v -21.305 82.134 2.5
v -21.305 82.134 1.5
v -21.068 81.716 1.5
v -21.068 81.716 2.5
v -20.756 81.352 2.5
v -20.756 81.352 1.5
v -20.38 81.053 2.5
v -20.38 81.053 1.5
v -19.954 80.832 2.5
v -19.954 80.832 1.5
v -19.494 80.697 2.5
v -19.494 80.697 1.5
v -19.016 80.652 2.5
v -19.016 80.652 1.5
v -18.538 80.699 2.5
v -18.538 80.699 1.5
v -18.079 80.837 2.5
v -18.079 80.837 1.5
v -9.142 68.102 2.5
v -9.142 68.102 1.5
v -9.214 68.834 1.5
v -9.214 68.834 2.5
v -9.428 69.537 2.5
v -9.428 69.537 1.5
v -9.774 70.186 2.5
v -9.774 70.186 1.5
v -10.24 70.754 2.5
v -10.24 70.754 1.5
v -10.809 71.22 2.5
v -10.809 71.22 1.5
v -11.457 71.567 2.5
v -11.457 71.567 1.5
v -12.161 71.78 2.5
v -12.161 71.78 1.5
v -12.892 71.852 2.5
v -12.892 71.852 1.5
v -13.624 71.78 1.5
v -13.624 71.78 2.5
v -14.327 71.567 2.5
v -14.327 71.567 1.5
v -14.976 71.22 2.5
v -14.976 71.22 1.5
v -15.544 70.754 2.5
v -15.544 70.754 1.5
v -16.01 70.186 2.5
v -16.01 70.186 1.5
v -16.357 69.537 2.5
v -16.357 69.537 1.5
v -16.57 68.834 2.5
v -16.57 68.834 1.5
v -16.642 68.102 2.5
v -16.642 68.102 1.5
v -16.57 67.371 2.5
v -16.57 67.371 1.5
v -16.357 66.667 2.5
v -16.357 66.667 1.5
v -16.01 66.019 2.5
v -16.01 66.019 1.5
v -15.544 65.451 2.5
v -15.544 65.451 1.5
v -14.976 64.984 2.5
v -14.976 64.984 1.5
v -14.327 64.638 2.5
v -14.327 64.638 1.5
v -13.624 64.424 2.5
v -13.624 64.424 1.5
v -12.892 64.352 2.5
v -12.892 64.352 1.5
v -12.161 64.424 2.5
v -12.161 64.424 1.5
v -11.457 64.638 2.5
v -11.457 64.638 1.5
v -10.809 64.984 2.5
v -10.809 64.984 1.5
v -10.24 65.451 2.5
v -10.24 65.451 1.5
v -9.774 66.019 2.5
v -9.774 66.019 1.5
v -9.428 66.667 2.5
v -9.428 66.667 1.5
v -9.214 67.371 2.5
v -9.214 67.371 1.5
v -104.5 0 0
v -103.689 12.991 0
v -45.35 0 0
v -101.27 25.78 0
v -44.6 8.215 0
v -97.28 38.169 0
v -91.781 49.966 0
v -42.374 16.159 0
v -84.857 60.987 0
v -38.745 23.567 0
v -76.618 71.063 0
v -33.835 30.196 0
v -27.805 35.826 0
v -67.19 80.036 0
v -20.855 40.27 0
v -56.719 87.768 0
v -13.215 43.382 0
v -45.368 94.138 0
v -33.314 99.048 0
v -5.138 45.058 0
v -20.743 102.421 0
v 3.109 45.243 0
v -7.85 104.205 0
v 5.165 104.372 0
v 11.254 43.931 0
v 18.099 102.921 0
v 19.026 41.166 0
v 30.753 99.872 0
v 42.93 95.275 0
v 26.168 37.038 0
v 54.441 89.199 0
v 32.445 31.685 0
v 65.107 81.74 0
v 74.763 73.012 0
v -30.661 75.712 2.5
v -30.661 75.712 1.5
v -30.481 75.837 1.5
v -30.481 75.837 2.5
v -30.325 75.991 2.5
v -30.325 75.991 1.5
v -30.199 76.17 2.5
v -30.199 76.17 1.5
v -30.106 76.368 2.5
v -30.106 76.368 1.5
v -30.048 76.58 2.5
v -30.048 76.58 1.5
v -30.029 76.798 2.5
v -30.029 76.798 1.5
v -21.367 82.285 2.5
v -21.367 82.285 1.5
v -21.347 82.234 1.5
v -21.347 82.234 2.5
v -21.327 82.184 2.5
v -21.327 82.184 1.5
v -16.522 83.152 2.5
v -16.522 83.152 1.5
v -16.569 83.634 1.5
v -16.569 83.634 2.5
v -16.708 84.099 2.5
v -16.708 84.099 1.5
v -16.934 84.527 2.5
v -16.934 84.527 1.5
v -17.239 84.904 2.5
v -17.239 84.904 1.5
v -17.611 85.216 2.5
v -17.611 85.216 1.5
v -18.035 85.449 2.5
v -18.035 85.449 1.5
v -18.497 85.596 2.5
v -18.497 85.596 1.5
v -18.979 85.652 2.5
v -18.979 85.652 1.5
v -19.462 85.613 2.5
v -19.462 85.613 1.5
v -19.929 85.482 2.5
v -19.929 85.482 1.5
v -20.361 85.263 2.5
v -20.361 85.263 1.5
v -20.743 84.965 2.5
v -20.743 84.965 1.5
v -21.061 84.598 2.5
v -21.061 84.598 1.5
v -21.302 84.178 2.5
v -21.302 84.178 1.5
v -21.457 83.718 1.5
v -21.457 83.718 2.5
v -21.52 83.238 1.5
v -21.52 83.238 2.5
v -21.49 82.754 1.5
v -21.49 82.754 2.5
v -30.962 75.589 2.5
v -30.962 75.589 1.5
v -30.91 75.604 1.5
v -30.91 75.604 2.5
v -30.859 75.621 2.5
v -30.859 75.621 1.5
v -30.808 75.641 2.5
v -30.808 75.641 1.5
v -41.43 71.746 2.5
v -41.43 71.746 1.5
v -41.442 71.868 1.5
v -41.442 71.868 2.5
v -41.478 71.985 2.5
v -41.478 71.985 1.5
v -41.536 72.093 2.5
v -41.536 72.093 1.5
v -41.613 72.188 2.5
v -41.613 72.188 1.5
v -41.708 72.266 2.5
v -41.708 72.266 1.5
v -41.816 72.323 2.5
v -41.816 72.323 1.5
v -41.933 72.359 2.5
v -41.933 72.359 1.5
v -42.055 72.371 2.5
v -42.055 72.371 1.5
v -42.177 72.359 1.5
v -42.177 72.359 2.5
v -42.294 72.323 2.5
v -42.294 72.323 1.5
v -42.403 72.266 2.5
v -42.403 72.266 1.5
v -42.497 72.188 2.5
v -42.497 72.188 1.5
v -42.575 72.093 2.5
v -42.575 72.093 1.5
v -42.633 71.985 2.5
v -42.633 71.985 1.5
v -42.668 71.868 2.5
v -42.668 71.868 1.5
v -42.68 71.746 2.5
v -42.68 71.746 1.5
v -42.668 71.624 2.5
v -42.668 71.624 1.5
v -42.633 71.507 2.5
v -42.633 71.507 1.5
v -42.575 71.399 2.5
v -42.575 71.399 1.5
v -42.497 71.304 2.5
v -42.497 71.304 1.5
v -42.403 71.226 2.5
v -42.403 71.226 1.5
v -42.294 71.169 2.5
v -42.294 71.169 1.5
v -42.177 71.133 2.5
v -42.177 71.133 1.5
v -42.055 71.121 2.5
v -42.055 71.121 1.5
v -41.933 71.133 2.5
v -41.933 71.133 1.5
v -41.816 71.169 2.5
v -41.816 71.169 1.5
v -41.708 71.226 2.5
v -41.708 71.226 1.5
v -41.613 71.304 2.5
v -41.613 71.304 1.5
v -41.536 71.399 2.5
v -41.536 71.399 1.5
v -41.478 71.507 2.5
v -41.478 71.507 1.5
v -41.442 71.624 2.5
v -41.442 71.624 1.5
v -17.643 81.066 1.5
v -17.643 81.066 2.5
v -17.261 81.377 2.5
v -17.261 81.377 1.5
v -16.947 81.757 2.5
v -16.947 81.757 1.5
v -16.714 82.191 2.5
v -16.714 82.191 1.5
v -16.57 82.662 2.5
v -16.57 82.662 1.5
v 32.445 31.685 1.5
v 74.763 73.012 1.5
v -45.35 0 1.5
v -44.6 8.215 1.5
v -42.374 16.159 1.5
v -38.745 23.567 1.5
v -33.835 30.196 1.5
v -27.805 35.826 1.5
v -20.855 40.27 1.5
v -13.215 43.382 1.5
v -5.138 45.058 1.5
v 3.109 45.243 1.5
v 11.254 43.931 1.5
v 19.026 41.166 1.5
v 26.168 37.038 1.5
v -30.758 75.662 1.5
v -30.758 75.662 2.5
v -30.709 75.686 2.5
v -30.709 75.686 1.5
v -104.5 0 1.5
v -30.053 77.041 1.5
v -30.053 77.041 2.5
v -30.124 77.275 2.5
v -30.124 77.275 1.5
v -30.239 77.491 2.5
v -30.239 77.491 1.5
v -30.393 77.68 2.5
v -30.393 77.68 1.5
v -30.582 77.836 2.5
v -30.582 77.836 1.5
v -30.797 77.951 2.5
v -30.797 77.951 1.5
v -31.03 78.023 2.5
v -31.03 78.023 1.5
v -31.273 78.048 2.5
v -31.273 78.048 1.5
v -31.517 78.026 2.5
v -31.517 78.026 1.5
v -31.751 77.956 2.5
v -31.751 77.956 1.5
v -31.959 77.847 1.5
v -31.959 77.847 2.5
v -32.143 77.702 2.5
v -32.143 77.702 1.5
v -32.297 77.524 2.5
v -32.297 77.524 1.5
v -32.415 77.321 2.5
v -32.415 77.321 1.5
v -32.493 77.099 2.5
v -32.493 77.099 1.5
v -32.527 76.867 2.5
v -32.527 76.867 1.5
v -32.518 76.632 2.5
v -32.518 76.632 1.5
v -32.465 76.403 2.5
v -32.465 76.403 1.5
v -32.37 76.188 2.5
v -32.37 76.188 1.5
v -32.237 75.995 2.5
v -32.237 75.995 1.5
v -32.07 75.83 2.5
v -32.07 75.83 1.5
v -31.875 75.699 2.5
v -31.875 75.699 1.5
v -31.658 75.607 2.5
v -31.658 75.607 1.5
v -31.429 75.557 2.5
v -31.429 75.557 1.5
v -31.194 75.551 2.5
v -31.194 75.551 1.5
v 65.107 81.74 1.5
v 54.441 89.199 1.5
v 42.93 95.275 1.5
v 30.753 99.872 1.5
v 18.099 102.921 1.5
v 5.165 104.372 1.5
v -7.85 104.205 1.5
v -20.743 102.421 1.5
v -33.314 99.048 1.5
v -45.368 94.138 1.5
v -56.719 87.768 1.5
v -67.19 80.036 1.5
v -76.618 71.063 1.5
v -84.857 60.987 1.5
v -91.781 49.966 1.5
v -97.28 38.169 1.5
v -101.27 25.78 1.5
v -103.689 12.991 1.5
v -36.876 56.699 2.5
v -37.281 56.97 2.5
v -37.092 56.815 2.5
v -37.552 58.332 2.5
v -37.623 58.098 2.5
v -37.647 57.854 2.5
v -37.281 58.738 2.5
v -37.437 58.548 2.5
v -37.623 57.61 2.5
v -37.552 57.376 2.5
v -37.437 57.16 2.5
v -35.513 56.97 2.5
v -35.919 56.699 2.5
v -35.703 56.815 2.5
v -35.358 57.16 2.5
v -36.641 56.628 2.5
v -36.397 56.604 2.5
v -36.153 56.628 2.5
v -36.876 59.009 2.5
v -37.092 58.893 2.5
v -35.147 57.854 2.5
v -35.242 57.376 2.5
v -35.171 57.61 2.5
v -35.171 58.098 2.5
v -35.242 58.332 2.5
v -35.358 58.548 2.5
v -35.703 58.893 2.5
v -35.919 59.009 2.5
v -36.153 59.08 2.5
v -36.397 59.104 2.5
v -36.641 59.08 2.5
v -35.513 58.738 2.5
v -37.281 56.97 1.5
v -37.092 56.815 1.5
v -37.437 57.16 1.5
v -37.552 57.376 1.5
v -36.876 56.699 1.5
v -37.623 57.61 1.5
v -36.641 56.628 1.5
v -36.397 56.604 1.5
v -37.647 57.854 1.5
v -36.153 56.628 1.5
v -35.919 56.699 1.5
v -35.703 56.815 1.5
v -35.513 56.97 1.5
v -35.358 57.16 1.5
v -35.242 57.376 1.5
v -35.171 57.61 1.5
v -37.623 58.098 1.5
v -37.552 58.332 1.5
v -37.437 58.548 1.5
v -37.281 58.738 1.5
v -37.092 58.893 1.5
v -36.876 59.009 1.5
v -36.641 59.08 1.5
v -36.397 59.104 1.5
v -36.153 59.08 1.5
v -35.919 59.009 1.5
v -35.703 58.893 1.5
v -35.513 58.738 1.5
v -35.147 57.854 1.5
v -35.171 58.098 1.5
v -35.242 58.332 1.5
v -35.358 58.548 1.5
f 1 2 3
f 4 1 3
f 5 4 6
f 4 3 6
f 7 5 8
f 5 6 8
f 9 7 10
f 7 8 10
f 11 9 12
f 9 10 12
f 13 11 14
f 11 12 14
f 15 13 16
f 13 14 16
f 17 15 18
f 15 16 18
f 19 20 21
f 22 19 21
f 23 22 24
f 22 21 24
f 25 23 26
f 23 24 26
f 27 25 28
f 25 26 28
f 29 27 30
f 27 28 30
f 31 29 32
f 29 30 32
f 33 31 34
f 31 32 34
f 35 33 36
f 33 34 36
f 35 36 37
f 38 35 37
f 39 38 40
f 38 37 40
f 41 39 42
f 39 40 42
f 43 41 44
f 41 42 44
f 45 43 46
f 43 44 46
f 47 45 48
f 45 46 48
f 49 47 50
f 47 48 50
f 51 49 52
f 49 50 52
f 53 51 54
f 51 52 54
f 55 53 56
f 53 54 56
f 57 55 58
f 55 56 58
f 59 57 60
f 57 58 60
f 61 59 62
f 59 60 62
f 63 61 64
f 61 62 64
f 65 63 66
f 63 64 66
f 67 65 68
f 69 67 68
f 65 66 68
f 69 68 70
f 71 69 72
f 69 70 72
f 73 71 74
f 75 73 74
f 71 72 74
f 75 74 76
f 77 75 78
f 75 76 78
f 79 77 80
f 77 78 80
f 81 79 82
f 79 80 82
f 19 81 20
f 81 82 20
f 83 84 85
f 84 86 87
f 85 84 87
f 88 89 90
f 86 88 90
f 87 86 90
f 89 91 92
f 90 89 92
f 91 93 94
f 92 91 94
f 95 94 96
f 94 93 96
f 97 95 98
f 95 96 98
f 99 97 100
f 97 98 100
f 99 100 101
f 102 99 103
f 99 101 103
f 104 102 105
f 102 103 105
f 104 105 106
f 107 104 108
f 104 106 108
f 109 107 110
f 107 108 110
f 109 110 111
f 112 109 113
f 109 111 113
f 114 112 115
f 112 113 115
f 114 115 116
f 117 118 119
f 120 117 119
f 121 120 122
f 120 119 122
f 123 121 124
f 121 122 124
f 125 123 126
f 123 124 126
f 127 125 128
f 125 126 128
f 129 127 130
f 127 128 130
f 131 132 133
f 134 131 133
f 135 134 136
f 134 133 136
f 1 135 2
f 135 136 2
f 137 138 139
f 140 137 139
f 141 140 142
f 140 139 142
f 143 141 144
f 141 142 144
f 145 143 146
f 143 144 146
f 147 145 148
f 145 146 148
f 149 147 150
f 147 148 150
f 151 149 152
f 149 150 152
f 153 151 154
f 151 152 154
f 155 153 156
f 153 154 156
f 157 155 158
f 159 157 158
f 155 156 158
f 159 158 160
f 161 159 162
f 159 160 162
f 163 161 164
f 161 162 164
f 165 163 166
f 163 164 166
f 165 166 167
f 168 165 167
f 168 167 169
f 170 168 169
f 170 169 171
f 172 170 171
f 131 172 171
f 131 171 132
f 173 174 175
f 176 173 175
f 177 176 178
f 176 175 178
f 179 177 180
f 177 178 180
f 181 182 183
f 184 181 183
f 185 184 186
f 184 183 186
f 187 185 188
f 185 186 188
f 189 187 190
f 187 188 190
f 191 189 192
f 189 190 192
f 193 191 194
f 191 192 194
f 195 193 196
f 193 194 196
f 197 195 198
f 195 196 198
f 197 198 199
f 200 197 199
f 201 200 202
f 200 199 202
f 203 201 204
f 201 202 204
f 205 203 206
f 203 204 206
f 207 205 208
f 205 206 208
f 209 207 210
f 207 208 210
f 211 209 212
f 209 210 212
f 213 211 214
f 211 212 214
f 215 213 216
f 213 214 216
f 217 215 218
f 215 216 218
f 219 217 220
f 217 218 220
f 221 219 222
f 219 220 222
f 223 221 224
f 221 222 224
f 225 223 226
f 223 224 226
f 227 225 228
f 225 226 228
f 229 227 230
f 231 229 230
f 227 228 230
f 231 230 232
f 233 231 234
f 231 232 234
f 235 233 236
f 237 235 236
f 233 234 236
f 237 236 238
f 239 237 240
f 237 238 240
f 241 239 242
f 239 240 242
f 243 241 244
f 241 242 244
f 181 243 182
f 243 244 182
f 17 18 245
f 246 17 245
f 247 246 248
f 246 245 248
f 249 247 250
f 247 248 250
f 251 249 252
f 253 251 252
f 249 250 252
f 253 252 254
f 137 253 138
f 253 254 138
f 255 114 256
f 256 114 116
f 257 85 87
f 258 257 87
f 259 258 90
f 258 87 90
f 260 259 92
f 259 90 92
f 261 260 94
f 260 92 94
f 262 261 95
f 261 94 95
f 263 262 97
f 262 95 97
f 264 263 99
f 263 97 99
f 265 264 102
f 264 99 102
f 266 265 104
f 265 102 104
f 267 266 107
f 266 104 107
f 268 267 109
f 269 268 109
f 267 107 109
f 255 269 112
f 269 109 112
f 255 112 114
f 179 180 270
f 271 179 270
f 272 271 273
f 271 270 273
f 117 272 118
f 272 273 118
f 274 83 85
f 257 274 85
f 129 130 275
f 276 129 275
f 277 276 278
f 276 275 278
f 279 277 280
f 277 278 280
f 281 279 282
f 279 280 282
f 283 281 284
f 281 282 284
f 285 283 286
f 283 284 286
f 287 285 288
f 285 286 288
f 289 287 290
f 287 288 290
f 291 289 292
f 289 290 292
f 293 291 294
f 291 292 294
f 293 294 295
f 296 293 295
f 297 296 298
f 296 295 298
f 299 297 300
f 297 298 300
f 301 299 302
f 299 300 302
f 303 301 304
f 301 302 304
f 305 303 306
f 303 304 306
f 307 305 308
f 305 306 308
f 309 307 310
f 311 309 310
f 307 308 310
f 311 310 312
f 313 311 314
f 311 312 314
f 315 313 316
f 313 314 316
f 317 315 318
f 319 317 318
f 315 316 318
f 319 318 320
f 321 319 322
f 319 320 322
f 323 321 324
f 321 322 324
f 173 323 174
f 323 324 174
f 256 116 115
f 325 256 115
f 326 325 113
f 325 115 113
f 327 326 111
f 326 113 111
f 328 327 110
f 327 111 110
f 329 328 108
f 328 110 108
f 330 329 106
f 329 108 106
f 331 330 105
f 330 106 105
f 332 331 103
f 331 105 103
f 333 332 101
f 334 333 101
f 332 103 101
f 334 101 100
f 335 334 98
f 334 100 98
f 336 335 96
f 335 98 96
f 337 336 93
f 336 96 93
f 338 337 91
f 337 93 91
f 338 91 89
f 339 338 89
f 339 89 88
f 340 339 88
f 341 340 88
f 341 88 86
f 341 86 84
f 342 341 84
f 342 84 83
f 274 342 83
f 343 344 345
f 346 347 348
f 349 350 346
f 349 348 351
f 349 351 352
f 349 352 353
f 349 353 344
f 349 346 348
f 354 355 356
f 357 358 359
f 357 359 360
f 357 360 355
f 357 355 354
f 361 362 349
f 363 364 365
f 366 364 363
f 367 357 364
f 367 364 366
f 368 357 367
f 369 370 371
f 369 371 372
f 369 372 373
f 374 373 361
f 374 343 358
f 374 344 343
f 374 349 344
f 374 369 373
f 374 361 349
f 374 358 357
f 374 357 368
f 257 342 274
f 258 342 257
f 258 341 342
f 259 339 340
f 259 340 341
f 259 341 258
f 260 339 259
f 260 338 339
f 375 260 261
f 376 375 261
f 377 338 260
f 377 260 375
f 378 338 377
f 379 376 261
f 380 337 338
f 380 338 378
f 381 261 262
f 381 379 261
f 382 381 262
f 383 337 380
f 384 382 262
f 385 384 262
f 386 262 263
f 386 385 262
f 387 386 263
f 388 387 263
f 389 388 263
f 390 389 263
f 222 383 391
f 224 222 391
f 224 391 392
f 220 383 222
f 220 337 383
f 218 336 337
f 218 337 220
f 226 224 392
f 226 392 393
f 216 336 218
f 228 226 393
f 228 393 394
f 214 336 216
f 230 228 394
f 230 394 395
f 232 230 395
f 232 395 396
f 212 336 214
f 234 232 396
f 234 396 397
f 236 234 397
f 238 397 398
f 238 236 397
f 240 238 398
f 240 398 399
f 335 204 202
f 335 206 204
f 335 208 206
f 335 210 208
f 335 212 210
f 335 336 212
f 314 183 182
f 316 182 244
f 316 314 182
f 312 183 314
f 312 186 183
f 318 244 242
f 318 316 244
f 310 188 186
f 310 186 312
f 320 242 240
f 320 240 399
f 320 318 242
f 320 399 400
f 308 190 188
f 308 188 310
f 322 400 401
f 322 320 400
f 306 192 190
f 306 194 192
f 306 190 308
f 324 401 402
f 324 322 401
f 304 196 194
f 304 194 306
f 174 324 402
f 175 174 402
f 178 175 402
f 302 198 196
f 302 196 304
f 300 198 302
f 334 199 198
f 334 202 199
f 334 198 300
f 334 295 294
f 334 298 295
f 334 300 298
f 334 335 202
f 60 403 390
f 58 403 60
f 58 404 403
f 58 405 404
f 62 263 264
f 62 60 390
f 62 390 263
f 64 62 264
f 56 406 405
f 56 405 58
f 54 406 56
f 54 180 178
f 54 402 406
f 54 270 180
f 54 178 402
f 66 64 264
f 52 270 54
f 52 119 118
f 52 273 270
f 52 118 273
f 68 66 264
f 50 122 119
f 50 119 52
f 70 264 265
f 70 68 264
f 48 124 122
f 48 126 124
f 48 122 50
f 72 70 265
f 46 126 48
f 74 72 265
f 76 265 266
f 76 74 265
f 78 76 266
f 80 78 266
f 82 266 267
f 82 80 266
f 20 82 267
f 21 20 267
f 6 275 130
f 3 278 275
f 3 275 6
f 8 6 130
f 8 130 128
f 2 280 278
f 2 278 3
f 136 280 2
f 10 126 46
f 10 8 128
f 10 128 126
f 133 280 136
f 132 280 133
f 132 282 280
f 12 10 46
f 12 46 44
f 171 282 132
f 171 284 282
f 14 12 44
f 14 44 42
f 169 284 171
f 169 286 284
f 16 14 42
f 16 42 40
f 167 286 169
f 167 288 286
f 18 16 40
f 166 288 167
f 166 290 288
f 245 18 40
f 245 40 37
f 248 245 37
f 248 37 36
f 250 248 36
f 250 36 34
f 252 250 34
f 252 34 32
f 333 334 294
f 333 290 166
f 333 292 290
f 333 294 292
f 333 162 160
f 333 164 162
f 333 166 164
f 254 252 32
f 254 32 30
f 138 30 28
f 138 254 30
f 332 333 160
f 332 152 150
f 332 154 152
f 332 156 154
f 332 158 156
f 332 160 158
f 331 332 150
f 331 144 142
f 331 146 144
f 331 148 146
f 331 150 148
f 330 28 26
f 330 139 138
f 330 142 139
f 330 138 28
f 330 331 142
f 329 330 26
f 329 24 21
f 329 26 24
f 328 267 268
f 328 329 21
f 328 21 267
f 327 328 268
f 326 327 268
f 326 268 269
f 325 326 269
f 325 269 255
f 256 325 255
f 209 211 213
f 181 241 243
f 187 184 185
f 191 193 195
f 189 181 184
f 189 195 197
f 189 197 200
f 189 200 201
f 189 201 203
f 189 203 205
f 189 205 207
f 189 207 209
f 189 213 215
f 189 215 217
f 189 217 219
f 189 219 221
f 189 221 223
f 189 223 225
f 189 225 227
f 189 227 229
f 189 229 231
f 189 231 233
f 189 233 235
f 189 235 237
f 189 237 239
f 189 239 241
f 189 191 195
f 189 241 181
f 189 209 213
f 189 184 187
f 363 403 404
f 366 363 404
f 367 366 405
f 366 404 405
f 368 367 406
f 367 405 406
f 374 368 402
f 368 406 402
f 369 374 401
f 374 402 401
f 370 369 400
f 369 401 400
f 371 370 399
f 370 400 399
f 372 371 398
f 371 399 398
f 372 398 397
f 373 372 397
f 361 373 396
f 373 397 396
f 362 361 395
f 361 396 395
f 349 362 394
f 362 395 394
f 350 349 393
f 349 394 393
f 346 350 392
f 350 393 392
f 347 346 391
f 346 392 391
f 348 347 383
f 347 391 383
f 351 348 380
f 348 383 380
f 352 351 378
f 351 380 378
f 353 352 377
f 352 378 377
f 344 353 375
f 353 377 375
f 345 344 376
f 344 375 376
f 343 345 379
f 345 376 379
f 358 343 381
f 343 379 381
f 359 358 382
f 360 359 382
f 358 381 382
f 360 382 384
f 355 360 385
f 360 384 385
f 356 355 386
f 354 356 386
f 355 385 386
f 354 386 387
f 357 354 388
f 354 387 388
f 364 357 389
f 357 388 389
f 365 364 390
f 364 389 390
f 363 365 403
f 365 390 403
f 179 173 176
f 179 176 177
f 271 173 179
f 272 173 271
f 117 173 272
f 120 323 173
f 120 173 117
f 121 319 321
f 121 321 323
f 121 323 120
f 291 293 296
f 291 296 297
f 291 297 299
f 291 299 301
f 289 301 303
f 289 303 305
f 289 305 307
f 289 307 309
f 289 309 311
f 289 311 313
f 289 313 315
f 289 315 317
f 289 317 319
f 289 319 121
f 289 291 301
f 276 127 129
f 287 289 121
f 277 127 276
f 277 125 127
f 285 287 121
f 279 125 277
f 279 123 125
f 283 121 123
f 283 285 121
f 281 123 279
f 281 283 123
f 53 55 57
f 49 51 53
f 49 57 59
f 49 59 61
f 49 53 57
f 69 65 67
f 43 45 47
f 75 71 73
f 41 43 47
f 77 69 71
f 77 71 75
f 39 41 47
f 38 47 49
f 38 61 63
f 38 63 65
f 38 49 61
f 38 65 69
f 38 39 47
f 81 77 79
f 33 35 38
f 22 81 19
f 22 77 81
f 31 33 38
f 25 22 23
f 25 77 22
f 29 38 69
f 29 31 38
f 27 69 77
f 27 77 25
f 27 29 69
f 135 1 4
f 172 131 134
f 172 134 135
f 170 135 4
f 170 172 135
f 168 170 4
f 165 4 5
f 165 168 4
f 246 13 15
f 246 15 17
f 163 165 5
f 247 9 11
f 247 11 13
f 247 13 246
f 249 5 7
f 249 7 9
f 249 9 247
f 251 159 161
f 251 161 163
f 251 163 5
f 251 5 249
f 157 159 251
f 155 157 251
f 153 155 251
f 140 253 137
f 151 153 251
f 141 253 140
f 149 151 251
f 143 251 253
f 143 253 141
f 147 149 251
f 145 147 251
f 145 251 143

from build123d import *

# Parameters (mm, degrees)
F1_DEPTH = 1.5
F2_R     = 0.625
F2_R_2   = 1.25
F2_R_3   = 3.75
F3_DEPTH = 1


with BuildPart() as f1:
    # F0 (on Top) → F1 (new body)
    with BuildSketch(Plane.XY):
        with BuildLine():
            Line((32.444928, 31.685156), (74.762845, 73.012102))
            ThreePointArc((74.762845, 73.012102), (-39.417843, 96.780595), (-104.5, 0))
            Line((-104.5, 0), (-45.35, 0))
            ThreePointArc((-45.35, 0), (-17.106212, 42), (32.444928, 31.685156))
        make_face()
    extrude(amount=F1_DEPTH)

    # F2 (on face) → F3 (join)
    with BuildSketch(Plane.XY.offset(1.5)):
        with BuildLine():
            ThreePointArc((-30.96232, 75.58918), (-30.884194, 75.612404), (-30.807747, 75.640671))
            Line((-30.807747, 75.640671), (-30.811752, 75.650505))
            Line((-30.811752, 75.650505), (-30.96232, 75.58918))
        make_face()
        with BuildLine():
            Line((-30.811752, 75.650505), (-30.807747, 75.640671))
            ThreePointArc((-30.807747, 75.640671), (-30.733305, 75.67386), (-30.661184, 75.71183))
            Line((-30.661184, 75.71183), (-30.811752, 75.650505))
        make_face()
        with BuildLine():
            Line((-30.96232, 75.58918), (-30.811752, 75.650505))
            Line((-30.811752, 75.650505), (-31.750758, 77.955996))
            ThreePointArc((-31.750758, 77.955996), (-32.465182, 76.403275), (-30.96232, 75.58918))
        make_face()
        with BuildLine():
            Line((-31.750758, 77.955996), (-30.811752, 75.650505))
            Line((-30.811752, 75.650505), (-30.661184, 75.71183))
            ThreePointArc((-30.661184, 75.71183), (-30.198724, 76.169878), (-30.029252, 76.798334))
            ThreePointArc((-30.029252, 76.798334), (-30.581715, 77.835609), (-31.750758, 77.955996))
        make_face()
        with BuildLine():
            ThreePointArc((-21.366645, 82.285112), (-21.337038, 82.208873), (-21.304953, 82.133643))
            Line((-21.304953, 82.133643), (-21.366645, 82.285112))
        make_face()
        with BuildLine():
            Line((-21.366645, 82.285112), (-21.304953, 82.133643))
            ThreePointArc((-21.304953, 82.133643), (-19.954269, 80.832328), (-18.078702, 80.836558))
            ThreePointArc((-18.078702, 80.836558), (-16.947162, 81.756808), (-16.521713, 83.151883))
            ThreePointArc((-16.521713, 83.151883), (-19.46198, 85.612811), (-21.366645, 82.285112))
        make_face()
        with Locations((-42.055275, 71.745973)):
            Circle(F2_R)
        with Locations((-36.397212, 57.854021)):
            Circle(F2_R_2)
        with Locations((-12.892144, 68.102269)):
            Circle(F2_R_3)
    extrude(amount=F3_DEPTH)


solid = f1.part
